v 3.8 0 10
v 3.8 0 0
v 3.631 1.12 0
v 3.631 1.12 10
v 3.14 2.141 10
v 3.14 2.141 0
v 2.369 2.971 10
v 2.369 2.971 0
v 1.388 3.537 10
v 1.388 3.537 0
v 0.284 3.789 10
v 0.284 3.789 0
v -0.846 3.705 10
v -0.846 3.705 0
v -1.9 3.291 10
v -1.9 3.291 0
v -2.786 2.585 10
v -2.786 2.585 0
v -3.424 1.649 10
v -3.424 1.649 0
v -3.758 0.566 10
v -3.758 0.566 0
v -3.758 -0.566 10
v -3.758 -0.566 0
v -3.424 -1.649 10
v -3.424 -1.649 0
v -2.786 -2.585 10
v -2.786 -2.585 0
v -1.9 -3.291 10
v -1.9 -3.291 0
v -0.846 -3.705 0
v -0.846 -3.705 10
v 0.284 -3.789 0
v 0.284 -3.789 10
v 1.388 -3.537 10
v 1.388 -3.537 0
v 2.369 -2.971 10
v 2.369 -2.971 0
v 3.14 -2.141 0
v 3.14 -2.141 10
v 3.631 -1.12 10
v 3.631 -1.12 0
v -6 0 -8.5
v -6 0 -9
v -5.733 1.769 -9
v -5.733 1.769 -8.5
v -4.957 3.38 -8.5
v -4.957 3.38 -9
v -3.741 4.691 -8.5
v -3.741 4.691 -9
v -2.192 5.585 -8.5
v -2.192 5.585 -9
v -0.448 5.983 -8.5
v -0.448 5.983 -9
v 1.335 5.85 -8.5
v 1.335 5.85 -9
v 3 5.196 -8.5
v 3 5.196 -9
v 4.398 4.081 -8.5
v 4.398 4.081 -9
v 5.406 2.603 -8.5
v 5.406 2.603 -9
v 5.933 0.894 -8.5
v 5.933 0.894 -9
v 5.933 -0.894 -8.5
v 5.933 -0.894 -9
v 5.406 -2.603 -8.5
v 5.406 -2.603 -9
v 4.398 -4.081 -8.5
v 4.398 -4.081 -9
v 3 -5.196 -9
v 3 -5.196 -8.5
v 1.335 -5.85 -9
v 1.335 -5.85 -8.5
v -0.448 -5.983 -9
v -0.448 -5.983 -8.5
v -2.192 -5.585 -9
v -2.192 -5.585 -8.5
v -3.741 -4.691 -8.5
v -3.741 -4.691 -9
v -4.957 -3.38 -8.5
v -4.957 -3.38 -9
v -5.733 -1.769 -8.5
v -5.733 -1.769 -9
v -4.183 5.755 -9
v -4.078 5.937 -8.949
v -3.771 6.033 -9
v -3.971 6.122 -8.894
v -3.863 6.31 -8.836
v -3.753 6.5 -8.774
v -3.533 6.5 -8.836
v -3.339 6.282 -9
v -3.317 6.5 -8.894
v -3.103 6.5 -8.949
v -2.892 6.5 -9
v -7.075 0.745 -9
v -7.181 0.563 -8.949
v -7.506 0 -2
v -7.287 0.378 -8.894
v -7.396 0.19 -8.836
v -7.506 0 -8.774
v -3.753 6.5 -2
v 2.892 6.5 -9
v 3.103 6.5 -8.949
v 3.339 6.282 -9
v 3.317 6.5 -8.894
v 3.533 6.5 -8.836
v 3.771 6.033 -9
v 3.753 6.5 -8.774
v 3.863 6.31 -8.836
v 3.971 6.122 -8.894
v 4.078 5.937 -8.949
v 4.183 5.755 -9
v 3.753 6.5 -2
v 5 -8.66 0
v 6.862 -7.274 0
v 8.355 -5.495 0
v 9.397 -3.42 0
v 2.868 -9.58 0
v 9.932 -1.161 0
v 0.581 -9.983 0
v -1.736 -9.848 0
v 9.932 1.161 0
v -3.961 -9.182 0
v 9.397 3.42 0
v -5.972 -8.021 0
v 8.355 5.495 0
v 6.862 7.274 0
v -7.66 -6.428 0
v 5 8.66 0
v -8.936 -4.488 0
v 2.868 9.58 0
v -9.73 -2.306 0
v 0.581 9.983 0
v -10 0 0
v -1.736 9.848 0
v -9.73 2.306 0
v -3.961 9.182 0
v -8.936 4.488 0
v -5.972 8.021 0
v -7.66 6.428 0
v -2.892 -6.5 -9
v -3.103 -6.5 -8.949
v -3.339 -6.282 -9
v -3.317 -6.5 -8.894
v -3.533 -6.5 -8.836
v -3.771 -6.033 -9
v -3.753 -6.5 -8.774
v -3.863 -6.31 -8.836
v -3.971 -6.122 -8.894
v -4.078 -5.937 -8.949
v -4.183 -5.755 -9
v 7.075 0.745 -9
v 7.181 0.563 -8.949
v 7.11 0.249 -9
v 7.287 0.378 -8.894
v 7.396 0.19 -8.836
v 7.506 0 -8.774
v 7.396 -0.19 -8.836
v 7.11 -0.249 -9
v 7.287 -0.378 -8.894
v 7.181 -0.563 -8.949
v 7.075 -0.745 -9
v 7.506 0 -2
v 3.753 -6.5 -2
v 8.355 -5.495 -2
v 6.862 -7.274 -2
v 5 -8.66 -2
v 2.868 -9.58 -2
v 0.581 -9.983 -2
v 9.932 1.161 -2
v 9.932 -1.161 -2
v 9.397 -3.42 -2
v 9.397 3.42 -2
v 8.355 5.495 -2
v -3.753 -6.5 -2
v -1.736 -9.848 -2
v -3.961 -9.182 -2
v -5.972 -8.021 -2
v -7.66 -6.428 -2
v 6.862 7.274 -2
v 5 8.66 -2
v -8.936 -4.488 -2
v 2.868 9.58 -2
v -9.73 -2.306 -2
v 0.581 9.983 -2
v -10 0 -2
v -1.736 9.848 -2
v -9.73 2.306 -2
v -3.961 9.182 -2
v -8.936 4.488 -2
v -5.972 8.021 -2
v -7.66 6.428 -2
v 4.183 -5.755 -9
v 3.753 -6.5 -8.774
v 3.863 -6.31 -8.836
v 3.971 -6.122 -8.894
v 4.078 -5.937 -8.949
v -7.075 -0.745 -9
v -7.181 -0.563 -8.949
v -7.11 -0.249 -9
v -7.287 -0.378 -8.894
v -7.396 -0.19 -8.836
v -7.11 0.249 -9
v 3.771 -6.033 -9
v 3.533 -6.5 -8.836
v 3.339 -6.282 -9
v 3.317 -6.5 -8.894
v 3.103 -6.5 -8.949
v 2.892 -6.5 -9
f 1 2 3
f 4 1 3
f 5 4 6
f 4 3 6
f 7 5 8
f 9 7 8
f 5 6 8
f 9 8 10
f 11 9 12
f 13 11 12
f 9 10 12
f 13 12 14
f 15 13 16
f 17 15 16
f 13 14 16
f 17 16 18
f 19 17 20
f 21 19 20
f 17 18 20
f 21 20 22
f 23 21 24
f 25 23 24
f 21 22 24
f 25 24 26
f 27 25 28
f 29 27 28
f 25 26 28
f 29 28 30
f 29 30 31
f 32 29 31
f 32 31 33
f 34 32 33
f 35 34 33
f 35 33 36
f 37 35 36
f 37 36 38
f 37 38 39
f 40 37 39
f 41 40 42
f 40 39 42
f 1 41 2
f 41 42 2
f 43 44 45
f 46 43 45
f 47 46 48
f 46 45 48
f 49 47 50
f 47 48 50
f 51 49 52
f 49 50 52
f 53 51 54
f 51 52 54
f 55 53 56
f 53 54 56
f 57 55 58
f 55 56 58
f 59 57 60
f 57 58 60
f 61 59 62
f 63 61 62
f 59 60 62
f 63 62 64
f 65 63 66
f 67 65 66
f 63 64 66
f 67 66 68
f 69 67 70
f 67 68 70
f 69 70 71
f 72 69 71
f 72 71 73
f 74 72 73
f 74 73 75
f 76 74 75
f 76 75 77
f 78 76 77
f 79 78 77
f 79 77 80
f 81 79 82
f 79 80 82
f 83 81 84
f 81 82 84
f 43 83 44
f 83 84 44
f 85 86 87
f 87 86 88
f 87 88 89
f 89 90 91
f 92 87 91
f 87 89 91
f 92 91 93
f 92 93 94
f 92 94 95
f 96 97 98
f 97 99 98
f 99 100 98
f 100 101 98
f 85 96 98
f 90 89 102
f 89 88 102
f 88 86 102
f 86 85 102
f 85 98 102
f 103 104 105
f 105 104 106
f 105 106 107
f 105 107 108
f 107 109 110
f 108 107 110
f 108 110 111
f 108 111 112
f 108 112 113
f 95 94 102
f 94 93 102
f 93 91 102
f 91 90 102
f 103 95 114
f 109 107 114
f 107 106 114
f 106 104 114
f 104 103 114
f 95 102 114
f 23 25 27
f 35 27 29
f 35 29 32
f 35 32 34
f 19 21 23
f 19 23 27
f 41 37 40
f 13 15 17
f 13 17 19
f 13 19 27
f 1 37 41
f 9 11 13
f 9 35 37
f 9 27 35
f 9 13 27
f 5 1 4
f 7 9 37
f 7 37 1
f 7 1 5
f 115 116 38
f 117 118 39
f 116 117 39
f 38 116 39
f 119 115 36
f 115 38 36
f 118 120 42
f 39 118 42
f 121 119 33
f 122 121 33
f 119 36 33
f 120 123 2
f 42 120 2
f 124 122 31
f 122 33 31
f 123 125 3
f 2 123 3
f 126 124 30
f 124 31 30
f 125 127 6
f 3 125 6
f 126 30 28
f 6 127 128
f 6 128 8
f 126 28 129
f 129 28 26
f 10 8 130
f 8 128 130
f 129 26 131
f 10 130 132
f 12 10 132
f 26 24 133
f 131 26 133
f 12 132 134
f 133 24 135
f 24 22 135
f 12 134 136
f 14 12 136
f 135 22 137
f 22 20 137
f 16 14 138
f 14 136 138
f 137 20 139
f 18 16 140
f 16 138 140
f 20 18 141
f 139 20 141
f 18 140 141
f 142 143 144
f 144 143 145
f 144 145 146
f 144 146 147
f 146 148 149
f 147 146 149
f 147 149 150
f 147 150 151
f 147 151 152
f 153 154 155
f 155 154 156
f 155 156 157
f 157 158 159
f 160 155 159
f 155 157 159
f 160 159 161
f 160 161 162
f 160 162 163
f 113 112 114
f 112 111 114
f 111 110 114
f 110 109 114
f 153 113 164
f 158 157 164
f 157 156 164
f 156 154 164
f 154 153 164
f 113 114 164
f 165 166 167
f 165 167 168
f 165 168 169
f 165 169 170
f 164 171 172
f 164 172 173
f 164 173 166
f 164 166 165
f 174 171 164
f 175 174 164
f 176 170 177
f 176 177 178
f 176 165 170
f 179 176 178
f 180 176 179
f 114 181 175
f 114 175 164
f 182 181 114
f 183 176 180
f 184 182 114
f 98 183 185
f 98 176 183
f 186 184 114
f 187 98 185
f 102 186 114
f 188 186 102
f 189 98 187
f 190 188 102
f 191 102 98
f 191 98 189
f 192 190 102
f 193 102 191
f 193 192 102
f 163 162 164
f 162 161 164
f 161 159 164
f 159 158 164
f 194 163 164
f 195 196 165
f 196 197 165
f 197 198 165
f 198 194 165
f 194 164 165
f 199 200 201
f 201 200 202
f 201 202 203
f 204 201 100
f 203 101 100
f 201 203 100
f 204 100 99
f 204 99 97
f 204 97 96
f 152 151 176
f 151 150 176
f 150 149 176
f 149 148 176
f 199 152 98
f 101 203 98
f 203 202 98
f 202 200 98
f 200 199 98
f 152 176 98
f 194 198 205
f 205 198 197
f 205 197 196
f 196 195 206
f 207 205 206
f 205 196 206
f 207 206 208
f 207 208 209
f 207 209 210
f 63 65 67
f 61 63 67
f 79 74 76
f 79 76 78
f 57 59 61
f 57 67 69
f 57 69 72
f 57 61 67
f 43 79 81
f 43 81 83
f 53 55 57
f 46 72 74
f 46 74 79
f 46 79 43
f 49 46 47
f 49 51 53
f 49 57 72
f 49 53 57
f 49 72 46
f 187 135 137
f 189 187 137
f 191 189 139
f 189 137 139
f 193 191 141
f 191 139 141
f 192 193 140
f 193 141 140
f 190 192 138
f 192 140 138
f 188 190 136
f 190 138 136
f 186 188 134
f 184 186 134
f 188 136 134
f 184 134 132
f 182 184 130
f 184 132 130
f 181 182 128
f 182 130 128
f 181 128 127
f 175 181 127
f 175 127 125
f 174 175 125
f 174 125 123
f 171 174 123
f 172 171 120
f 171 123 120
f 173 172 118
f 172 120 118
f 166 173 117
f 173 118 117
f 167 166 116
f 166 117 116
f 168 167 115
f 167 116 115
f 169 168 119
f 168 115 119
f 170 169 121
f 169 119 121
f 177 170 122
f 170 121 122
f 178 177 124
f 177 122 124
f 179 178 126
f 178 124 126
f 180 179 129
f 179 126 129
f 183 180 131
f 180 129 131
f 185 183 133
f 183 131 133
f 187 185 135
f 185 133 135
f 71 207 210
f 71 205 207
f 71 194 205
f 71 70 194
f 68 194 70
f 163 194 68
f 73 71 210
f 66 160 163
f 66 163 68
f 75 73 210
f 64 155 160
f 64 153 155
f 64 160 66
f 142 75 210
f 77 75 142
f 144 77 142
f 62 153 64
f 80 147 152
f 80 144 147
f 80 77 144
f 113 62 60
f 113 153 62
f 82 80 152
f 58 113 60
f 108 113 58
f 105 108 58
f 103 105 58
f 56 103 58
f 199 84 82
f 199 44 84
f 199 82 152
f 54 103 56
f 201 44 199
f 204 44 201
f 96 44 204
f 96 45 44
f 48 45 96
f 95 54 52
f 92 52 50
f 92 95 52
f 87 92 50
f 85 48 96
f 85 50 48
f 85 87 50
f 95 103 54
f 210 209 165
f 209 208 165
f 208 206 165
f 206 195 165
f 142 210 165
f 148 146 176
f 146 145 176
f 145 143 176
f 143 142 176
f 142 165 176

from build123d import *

# Parameters (mm, degrees)
CROQUIS1_R              = 3.8
SALIENTE_EXTRUIR1_DEPTH = 10
CROQUIS3_R              = 10
SALIENTE_EXTRUIR2_DEPTH = 2
SALIENTE_EXTRUIR3_DEPTH = 7
CROQUIS6_R              = 6
CORTAR_EXTRUIR6_DEPTH   = 0.5


with BuildPart() as part:
    # Croquis1 → Saliente-Extruir1 (new body)
    with BuildSketch(Plane.XY):
        Circle(CROQUIS1_R)
    extrude(amount=SALIENTE_EXTRUIR1_DEPTH)

    # Croquis3 → Saliente-Extruir2 (add)
    with BuildSketch(Plane(origin=(0, 0, 0), x_dir=(-1, 0, 0), z_dir=(0, 0, -1))):
        Circle(CROQUIS3_R)
    extrude(amount=SALIENTE_EXTRUIR2_DEPTH)

    # Croquis4 → Saliente-Extruir3 (add)
    with BuildSketch(Plane(origin=(0, 0, -2), x_dir=(-1, 0, 0), z_dir=(0, 0, -1))):
        Polygon((3.75277675, -6.5), (7.505553499, 0), (3.75277675, 6.5), (-3.75277675, 6.5), (-7.505553499, 0), (-3.75277675, -6.5), align=None)
    extrude(amount=SALIENTE_EXTRUIR3_DEPTH)

    # Croquis6 → Cortar-Extruir6 (cut)
    with BuildSketch(Plane(origin=(0, 0, -9), x_dir=(-1, 0, 0), z_dir=(0, 0, -1))):
        Circle(CROQUIS6_R)
    extrude(amount=-CORTAR_EXTRUIR6_DEPTH, mode=Mode.SUBTRACT)

    # Croquis7 → Cortar-Revolución1 (revolve, cut)
    with BuildSketch(Plane(origin=(0, 0, 0), x_dir=(1, 0, 0), z_dir=(0, 1, 0))):
        Polygon((-5.5, 15.2), (-5.5, 9.932050808), (-8.5, 8.2), (-8.5, 15.2), align=None)
    revolve(axis=Axis((0, 0, 0), (0, 0, -1)), mode=Mode.SUBTRACT)


solid = part.part
